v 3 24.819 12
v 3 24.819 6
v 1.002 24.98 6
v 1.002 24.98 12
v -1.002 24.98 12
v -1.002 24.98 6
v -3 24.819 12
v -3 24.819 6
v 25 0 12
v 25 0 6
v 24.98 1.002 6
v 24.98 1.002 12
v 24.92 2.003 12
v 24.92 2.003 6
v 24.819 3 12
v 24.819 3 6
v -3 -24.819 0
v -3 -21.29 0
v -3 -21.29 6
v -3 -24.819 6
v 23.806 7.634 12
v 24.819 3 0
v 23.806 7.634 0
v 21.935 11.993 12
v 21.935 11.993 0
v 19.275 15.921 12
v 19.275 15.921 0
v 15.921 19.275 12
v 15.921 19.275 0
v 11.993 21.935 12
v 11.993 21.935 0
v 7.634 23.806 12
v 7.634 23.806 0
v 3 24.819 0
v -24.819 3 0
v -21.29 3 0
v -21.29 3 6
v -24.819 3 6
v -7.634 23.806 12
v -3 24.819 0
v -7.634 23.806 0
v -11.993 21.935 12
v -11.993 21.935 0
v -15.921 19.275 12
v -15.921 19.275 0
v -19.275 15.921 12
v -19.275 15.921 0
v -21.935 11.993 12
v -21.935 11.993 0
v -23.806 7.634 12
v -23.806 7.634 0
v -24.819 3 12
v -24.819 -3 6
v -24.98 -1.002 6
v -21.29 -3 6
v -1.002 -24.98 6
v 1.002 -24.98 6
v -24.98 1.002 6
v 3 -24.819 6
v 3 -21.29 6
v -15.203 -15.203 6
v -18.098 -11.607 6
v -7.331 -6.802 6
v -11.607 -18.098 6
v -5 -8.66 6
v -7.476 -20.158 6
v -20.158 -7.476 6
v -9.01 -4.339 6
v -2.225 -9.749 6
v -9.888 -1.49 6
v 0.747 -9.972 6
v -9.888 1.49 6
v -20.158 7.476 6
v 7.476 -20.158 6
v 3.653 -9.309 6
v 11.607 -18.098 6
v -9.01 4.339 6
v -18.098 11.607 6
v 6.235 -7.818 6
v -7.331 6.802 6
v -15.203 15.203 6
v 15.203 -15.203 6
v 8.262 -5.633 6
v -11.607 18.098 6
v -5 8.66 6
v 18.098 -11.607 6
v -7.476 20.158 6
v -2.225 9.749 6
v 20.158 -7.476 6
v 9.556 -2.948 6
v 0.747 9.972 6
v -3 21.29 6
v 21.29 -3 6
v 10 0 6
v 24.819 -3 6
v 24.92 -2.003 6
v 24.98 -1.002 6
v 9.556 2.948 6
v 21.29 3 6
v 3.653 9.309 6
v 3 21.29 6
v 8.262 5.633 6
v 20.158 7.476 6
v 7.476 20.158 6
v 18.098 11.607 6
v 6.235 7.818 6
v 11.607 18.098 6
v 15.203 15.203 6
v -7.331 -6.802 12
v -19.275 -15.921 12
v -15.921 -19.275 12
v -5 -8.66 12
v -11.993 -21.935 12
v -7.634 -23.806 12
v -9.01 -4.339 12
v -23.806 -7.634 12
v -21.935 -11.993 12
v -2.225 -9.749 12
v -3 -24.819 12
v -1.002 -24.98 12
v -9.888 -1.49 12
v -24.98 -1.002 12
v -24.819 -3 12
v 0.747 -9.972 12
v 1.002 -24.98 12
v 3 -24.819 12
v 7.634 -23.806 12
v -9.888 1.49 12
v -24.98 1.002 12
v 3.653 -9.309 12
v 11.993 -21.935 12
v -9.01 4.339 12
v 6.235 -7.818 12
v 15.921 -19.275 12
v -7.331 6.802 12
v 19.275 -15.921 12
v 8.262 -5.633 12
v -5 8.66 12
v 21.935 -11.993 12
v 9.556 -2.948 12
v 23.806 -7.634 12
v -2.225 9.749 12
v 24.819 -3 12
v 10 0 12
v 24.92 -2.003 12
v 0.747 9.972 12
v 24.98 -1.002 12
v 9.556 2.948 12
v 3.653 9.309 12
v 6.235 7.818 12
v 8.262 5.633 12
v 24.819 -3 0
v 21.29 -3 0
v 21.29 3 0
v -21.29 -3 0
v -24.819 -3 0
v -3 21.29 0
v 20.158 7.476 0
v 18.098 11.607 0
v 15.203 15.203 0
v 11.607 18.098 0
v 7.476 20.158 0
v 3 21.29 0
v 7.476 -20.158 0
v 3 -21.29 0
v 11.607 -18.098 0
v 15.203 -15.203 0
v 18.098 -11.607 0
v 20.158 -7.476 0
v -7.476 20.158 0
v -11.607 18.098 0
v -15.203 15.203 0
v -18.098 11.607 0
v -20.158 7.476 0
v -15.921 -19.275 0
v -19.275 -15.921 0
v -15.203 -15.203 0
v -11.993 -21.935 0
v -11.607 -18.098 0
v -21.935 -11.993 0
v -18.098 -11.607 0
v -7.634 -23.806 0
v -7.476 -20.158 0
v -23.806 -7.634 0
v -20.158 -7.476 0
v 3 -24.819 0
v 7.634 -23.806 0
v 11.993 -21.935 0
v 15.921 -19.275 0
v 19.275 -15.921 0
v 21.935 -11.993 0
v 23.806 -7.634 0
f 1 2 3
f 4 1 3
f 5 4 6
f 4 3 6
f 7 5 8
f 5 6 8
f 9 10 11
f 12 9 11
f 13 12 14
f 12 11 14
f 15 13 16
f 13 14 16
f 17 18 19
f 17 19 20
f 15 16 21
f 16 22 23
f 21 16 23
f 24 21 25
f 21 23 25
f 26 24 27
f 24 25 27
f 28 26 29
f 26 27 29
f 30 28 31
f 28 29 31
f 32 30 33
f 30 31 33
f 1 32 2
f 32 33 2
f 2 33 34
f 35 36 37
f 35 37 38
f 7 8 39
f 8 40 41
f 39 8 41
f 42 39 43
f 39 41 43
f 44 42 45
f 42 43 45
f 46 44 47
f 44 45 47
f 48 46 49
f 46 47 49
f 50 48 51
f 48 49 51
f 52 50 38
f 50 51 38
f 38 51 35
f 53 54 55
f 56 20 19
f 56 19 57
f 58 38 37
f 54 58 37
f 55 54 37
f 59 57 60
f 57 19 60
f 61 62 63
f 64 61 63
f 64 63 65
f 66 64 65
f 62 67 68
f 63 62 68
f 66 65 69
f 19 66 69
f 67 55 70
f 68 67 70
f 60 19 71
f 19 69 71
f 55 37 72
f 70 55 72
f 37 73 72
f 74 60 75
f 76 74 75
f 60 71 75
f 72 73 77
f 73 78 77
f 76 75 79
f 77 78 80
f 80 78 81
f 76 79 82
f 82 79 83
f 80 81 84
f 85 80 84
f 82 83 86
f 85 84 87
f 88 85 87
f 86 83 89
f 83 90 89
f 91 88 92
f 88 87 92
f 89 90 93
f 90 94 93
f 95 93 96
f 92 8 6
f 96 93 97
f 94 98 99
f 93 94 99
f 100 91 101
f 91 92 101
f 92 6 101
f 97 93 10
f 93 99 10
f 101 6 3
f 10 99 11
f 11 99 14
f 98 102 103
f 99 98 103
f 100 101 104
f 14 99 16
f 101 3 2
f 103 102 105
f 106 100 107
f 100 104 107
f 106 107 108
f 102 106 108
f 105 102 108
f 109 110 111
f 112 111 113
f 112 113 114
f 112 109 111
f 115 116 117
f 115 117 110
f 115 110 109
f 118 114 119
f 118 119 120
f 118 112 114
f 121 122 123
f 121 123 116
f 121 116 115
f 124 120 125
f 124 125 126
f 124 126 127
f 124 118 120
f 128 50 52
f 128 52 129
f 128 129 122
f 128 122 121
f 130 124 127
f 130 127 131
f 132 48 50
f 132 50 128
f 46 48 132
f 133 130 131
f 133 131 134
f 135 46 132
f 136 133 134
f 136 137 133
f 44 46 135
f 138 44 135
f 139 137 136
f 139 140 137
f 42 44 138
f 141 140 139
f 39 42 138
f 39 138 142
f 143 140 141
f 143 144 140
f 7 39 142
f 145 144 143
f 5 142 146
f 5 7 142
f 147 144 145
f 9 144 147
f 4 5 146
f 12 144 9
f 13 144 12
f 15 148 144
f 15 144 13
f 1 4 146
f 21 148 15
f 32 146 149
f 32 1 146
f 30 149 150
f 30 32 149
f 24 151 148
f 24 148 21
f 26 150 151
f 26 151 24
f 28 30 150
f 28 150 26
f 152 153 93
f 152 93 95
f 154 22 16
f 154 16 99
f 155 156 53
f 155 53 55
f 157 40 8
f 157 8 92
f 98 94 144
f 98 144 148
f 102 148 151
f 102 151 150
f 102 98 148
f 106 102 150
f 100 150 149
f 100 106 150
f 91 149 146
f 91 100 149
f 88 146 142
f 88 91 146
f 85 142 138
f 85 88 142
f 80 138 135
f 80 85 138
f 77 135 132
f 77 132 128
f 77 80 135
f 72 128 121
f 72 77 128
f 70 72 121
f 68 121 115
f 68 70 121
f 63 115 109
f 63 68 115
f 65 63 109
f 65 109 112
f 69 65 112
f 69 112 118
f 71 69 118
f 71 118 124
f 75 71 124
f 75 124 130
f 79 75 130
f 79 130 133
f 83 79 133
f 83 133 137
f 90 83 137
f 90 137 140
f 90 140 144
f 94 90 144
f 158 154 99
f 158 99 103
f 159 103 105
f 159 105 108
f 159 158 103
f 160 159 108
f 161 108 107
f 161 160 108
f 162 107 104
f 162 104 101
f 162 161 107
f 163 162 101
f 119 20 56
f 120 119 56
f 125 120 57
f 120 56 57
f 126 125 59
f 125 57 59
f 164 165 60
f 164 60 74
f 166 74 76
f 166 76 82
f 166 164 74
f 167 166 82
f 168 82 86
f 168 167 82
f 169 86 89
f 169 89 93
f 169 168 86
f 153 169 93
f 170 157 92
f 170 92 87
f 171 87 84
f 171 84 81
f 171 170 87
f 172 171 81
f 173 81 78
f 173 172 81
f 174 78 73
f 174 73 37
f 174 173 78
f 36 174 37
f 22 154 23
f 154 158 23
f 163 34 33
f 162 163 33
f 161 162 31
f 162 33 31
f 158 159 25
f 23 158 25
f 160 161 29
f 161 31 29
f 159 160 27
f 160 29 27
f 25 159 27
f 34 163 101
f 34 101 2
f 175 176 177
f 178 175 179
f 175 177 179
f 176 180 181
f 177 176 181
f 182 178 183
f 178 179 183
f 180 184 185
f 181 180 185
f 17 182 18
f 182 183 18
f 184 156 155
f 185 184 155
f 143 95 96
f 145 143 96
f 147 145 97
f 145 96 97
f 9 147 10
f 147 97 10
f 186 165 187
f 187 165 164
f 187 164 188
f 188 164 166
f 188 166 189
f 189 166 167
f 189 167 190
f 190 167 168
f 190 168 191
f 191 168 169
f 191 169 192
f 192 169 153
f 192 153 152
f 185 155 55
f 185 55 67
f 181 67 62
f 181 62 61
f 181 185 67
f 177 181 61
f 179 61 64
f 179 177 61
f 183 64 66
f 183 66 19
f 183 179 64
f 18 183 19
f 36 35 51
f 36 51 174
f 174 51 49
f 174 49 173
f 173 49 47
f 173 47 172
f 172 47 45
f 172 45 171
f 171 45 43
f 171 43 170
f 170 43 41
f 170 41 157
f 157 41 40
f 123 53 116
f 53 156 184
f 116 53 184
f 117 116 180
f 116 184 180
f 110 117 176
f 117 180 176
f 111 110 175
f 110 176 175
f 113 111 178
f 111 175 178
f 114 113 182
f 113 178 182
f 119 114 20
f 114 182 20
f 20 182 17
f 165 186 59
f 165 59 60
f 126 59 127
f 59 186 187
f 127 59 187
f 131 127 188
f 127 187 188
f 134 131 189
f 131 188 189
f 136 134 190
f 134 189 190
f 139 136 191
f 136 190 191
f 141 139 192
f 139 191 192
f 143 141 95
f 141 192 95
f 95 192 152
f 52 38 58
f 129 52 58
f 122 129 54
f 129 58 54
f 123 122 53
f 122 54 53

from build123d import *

# Parameters (mm, degrees)
F0_R     = 10
F1_DEPTH = 12
F2_DEPTH = 6
F3_DEPTH = 6


with BuildPart() as f1:
    # F0 (on Top) → F1 (new body)
    with BuildSketch(Plane.XY):
        with BuildLine():
            ThreePointArc((21.5, 0), (21.4473527551, 1.5036820799), (21.289668856, 3))
            ThreePointArc((21.289668856, 3), (15.2027957955, 15.2027957955), (3, 21.289668856))
            ThreePointArc((3, 21.289668856), (0, 21.5), (-3, 21.289668856))
            ThreePointArc((-3, 21.289668856), (-15.2027957955, 15.2027957955), (-21.289668856, 3))
            ThreePointArc((-21.289668856, 3), (-21.5, 0), (-21.289668856, -3))
            ThreePointArc((-21.289668856, -3), (-15.2027957955, -15.2027957955), (-3, -21.289668856))
            ThreePointArc((-3, -21.289668856), (0, -21.5), (3, -21.289668856))
            ThreePointArc((3, -21.289668856), (15.2027957955, -15.2027957955), (21.289668856, -3))
            ThreePointArc((21.289668856, -3), (21.4473527551, -1.5036820799), (21.5, 0))
        make_face()
        Circle(F0_R, mode=Mode.SUBTRACT)
        with BuildLine():
            Line((21.289668856, 3), (24.819347292, 3))
            ThreePointArc((24.819347292, 3), (17.6776695297, 17.6776695297), (3, 24.819347292))
            Line((3, 24.819347292), (3, 21.289668856))
            ThreePointArc((3, 21.289668856), (15.2027957955, 15.2027957955), (21.289668856, 3))
        make_face()
        with BuildLine():
            Line((3, 21.289668856), (3, 24.819347292))
            ThreePointArc((3, 24.819347292), (0, 25), (-3, 24.819347292))
            Line((-3, 24.819347292), (-3, 21.289668856))
            ThreePointArc((-3, 21.289668856), (0, 21.5), (3, 21.289668856))
        make_face()
        with BuildLine():
            Line((-3, 21.289668856), (-3, 24.819347292))
            ThreePointArc((-3, 24.819347292), (-17.6776695297, 17.6776695297), (-24.819347292, 3))
            Line((-24.819347292, 3), (-21.289668856, 3))
            ThreePointArc((-21.289668856, 3), (-15.2027957955, 15.2027957955), (-3, 21.289668856))
        make_face()
        with BuildLine():
            Line((-21.289668856, 3), (-24.819347292, 3))
            ThreePointArc((-24.819347292, 3), (-25, 0), (-24.819347292, -3))
            Line((-24.819347292, -3), (-21.289668856, -3))
            ThreePointArc((-21.289668856, -3), (-21.5, 0), (-21.289668856, 3))
        make_face()
        with BuildLine():
            ThreePointArc((-24.819347292, -3), (-17.6776695297, -17.6776695297), (-3, -24.819347292))
            Line((-3, -24.819347292), (-3, -21.289668856))
            ThreePointArc((-3, -21.289668856), (-15.2027957955, -15.2027957955), (-21.289668856, -3))
            Line((-21.289668856, -3), (-24.819347292, -3))
        make_face()
        with BuildLine():
            ThreePointArc((-3, -24.819347292), (0, -25), (3, -24.819347292))
            Line((3, -24.819347292), (3, -21.289668856))
            ThreePointArc((3, -21.289668856), (0, -21.5), (-3, -21.289668856))
            Line((-3, -21.289668856), (-3, -24.819347292))
        make_face()
        with BuildLine():
            ThreePointArc((3, -24.819347292), (17.6776695297, -17.6776695297), (24.819347292, -3))
            Line((24.819347292, -3), (21.289668856, -3))
            ThreePointArc((21.289668856, -3), (15.2027957955, -15.2027957955), (3, -21.289668856))
            Line((3, -21.289668856), (3, -24.819347292))
        make_face()
        with BuildLine():
            ThreePointArc((24.819347292, -3), (24.9547959549, -1.5027171558), (25, 0))
            ThreePointArc((25, 0), (24.9547959549, 1.5027171558), (24.819347292, 3))
            Line((24.819347292, 3), (21.289668856, 3))
            ThreePointArc((21.289668856, 3), (21.4473527551, 1.5036820799), (21.5, 0))
            ThreePointArc((21.5, 0), (21.4473527551, -1.5036820799), (21.289668856, -3))
            Line((21.289668856, -3), (24.819347292, -3))
        make_face()
    extrude(amount=F1_DEPTH)

    # F0 (on Top) → F2 (cut)
    with BuildSketch(Plane.XY):
        with BuildLine():
            ThreePointArc((21.5, 0), (21.4473527551, 1.5036820799), (21.289668856, 3))
            ThreePointArc((21.289668856, 3), (15.2027957955, 15.2027957955), (3, 21.289668856))
            ThreePointArc((3, 21.289668856), (0, 21.5), (-3, 21.289668856))
            ThreePointArc((-3, 21.289668856), (-15.2027957955, 15.2027957955), (-21.289668856, 3))
            ThreePointArc((-21.289668856, 3), (-21.5, 0), (-21.289668856, -3))
            ThreePointArc((-21.289668856, -3), (-15.2027957955, -15.2027957955), (-3, -21.289668856))
            ThreePointArc((-3, -21.289668856), (0, -21.5), (3, -21.289668856))
            ThreePointArc((3, -21.289668856), (15.2027957955, -15.2027957955), (21.289668856, -3))
            ThreePointArc((21.289668856, -3), (21.4473527551, -1.5036820799), (21.5, 0))
        make_face()
        Circle(F0_R, mode=Mode.SUBTRACT)
    extrude(amount=F2_DEPTH, mode=Mode.SUBTRACT)

    # F0 (on Top) → F3 (cut)
    with BuildSketch(Plane.XY):
        with BuildLine():
            Line((3, 21.289668856), (3, 24.819347292))
            ThreePointArc((3, 24.819347292), (0, 25), (-3, 24.819347292))
            Line((-3, 24.819347292), (-3, 21.289668856))
            ThreePointArc((-3, 21.289668856), (0, 21.5), (3, 21.289668856))
        make_face()
        with BuildLine():
            ThreePointArc((-3, -24.819347292), (0, -25), (3, -24.819347292))
            Line((3, -24.819347292), (3, -21.289668856))
            ThreePointArc((3, -21.289668856), (0, -21.5), (-3, -21.289668856))
            Line((-3, -21.289668856), (-3, -24.819347292))
        make_face()
        with BuildLine():
            Line((-21.289668856, 3), (-24.819347292, 3))
            ThreePointArc((-24.819347292, 3), (-25, 0), (-24.819347292, -3))
            Line((-24.819347292, -3), (-21.289668856, -3))
            ThreePointArc((-21.289668856, -3), (-21.5, 0), (-21.289668856, 3))
        make_face()
        with BuildLine():
            ThreePointArc((24.819347292, -3), (24.9547959549, -1.5027171558), (25, 0))
            ThreePointArc((25, 0), (24.9547959549, 1.5027171558), (24.819347292, 3))
            Line((24.819347292, 3), (21.289668856, 3))
            ThreePointArc((21.289668856, 3), (21.4473527551, 1.5036820799), (21.5, 0))
            ThreePointArc((21.5, 0), (21.4473527551, -1.5036820799), (21.289668856, -3))
            Line((21.289668856, -3), (24.819347292, -3))
        make_face()
    extrude(amount=F3_DEPTH, mode=Mode.SUBTRACT)


solid = f1.part
